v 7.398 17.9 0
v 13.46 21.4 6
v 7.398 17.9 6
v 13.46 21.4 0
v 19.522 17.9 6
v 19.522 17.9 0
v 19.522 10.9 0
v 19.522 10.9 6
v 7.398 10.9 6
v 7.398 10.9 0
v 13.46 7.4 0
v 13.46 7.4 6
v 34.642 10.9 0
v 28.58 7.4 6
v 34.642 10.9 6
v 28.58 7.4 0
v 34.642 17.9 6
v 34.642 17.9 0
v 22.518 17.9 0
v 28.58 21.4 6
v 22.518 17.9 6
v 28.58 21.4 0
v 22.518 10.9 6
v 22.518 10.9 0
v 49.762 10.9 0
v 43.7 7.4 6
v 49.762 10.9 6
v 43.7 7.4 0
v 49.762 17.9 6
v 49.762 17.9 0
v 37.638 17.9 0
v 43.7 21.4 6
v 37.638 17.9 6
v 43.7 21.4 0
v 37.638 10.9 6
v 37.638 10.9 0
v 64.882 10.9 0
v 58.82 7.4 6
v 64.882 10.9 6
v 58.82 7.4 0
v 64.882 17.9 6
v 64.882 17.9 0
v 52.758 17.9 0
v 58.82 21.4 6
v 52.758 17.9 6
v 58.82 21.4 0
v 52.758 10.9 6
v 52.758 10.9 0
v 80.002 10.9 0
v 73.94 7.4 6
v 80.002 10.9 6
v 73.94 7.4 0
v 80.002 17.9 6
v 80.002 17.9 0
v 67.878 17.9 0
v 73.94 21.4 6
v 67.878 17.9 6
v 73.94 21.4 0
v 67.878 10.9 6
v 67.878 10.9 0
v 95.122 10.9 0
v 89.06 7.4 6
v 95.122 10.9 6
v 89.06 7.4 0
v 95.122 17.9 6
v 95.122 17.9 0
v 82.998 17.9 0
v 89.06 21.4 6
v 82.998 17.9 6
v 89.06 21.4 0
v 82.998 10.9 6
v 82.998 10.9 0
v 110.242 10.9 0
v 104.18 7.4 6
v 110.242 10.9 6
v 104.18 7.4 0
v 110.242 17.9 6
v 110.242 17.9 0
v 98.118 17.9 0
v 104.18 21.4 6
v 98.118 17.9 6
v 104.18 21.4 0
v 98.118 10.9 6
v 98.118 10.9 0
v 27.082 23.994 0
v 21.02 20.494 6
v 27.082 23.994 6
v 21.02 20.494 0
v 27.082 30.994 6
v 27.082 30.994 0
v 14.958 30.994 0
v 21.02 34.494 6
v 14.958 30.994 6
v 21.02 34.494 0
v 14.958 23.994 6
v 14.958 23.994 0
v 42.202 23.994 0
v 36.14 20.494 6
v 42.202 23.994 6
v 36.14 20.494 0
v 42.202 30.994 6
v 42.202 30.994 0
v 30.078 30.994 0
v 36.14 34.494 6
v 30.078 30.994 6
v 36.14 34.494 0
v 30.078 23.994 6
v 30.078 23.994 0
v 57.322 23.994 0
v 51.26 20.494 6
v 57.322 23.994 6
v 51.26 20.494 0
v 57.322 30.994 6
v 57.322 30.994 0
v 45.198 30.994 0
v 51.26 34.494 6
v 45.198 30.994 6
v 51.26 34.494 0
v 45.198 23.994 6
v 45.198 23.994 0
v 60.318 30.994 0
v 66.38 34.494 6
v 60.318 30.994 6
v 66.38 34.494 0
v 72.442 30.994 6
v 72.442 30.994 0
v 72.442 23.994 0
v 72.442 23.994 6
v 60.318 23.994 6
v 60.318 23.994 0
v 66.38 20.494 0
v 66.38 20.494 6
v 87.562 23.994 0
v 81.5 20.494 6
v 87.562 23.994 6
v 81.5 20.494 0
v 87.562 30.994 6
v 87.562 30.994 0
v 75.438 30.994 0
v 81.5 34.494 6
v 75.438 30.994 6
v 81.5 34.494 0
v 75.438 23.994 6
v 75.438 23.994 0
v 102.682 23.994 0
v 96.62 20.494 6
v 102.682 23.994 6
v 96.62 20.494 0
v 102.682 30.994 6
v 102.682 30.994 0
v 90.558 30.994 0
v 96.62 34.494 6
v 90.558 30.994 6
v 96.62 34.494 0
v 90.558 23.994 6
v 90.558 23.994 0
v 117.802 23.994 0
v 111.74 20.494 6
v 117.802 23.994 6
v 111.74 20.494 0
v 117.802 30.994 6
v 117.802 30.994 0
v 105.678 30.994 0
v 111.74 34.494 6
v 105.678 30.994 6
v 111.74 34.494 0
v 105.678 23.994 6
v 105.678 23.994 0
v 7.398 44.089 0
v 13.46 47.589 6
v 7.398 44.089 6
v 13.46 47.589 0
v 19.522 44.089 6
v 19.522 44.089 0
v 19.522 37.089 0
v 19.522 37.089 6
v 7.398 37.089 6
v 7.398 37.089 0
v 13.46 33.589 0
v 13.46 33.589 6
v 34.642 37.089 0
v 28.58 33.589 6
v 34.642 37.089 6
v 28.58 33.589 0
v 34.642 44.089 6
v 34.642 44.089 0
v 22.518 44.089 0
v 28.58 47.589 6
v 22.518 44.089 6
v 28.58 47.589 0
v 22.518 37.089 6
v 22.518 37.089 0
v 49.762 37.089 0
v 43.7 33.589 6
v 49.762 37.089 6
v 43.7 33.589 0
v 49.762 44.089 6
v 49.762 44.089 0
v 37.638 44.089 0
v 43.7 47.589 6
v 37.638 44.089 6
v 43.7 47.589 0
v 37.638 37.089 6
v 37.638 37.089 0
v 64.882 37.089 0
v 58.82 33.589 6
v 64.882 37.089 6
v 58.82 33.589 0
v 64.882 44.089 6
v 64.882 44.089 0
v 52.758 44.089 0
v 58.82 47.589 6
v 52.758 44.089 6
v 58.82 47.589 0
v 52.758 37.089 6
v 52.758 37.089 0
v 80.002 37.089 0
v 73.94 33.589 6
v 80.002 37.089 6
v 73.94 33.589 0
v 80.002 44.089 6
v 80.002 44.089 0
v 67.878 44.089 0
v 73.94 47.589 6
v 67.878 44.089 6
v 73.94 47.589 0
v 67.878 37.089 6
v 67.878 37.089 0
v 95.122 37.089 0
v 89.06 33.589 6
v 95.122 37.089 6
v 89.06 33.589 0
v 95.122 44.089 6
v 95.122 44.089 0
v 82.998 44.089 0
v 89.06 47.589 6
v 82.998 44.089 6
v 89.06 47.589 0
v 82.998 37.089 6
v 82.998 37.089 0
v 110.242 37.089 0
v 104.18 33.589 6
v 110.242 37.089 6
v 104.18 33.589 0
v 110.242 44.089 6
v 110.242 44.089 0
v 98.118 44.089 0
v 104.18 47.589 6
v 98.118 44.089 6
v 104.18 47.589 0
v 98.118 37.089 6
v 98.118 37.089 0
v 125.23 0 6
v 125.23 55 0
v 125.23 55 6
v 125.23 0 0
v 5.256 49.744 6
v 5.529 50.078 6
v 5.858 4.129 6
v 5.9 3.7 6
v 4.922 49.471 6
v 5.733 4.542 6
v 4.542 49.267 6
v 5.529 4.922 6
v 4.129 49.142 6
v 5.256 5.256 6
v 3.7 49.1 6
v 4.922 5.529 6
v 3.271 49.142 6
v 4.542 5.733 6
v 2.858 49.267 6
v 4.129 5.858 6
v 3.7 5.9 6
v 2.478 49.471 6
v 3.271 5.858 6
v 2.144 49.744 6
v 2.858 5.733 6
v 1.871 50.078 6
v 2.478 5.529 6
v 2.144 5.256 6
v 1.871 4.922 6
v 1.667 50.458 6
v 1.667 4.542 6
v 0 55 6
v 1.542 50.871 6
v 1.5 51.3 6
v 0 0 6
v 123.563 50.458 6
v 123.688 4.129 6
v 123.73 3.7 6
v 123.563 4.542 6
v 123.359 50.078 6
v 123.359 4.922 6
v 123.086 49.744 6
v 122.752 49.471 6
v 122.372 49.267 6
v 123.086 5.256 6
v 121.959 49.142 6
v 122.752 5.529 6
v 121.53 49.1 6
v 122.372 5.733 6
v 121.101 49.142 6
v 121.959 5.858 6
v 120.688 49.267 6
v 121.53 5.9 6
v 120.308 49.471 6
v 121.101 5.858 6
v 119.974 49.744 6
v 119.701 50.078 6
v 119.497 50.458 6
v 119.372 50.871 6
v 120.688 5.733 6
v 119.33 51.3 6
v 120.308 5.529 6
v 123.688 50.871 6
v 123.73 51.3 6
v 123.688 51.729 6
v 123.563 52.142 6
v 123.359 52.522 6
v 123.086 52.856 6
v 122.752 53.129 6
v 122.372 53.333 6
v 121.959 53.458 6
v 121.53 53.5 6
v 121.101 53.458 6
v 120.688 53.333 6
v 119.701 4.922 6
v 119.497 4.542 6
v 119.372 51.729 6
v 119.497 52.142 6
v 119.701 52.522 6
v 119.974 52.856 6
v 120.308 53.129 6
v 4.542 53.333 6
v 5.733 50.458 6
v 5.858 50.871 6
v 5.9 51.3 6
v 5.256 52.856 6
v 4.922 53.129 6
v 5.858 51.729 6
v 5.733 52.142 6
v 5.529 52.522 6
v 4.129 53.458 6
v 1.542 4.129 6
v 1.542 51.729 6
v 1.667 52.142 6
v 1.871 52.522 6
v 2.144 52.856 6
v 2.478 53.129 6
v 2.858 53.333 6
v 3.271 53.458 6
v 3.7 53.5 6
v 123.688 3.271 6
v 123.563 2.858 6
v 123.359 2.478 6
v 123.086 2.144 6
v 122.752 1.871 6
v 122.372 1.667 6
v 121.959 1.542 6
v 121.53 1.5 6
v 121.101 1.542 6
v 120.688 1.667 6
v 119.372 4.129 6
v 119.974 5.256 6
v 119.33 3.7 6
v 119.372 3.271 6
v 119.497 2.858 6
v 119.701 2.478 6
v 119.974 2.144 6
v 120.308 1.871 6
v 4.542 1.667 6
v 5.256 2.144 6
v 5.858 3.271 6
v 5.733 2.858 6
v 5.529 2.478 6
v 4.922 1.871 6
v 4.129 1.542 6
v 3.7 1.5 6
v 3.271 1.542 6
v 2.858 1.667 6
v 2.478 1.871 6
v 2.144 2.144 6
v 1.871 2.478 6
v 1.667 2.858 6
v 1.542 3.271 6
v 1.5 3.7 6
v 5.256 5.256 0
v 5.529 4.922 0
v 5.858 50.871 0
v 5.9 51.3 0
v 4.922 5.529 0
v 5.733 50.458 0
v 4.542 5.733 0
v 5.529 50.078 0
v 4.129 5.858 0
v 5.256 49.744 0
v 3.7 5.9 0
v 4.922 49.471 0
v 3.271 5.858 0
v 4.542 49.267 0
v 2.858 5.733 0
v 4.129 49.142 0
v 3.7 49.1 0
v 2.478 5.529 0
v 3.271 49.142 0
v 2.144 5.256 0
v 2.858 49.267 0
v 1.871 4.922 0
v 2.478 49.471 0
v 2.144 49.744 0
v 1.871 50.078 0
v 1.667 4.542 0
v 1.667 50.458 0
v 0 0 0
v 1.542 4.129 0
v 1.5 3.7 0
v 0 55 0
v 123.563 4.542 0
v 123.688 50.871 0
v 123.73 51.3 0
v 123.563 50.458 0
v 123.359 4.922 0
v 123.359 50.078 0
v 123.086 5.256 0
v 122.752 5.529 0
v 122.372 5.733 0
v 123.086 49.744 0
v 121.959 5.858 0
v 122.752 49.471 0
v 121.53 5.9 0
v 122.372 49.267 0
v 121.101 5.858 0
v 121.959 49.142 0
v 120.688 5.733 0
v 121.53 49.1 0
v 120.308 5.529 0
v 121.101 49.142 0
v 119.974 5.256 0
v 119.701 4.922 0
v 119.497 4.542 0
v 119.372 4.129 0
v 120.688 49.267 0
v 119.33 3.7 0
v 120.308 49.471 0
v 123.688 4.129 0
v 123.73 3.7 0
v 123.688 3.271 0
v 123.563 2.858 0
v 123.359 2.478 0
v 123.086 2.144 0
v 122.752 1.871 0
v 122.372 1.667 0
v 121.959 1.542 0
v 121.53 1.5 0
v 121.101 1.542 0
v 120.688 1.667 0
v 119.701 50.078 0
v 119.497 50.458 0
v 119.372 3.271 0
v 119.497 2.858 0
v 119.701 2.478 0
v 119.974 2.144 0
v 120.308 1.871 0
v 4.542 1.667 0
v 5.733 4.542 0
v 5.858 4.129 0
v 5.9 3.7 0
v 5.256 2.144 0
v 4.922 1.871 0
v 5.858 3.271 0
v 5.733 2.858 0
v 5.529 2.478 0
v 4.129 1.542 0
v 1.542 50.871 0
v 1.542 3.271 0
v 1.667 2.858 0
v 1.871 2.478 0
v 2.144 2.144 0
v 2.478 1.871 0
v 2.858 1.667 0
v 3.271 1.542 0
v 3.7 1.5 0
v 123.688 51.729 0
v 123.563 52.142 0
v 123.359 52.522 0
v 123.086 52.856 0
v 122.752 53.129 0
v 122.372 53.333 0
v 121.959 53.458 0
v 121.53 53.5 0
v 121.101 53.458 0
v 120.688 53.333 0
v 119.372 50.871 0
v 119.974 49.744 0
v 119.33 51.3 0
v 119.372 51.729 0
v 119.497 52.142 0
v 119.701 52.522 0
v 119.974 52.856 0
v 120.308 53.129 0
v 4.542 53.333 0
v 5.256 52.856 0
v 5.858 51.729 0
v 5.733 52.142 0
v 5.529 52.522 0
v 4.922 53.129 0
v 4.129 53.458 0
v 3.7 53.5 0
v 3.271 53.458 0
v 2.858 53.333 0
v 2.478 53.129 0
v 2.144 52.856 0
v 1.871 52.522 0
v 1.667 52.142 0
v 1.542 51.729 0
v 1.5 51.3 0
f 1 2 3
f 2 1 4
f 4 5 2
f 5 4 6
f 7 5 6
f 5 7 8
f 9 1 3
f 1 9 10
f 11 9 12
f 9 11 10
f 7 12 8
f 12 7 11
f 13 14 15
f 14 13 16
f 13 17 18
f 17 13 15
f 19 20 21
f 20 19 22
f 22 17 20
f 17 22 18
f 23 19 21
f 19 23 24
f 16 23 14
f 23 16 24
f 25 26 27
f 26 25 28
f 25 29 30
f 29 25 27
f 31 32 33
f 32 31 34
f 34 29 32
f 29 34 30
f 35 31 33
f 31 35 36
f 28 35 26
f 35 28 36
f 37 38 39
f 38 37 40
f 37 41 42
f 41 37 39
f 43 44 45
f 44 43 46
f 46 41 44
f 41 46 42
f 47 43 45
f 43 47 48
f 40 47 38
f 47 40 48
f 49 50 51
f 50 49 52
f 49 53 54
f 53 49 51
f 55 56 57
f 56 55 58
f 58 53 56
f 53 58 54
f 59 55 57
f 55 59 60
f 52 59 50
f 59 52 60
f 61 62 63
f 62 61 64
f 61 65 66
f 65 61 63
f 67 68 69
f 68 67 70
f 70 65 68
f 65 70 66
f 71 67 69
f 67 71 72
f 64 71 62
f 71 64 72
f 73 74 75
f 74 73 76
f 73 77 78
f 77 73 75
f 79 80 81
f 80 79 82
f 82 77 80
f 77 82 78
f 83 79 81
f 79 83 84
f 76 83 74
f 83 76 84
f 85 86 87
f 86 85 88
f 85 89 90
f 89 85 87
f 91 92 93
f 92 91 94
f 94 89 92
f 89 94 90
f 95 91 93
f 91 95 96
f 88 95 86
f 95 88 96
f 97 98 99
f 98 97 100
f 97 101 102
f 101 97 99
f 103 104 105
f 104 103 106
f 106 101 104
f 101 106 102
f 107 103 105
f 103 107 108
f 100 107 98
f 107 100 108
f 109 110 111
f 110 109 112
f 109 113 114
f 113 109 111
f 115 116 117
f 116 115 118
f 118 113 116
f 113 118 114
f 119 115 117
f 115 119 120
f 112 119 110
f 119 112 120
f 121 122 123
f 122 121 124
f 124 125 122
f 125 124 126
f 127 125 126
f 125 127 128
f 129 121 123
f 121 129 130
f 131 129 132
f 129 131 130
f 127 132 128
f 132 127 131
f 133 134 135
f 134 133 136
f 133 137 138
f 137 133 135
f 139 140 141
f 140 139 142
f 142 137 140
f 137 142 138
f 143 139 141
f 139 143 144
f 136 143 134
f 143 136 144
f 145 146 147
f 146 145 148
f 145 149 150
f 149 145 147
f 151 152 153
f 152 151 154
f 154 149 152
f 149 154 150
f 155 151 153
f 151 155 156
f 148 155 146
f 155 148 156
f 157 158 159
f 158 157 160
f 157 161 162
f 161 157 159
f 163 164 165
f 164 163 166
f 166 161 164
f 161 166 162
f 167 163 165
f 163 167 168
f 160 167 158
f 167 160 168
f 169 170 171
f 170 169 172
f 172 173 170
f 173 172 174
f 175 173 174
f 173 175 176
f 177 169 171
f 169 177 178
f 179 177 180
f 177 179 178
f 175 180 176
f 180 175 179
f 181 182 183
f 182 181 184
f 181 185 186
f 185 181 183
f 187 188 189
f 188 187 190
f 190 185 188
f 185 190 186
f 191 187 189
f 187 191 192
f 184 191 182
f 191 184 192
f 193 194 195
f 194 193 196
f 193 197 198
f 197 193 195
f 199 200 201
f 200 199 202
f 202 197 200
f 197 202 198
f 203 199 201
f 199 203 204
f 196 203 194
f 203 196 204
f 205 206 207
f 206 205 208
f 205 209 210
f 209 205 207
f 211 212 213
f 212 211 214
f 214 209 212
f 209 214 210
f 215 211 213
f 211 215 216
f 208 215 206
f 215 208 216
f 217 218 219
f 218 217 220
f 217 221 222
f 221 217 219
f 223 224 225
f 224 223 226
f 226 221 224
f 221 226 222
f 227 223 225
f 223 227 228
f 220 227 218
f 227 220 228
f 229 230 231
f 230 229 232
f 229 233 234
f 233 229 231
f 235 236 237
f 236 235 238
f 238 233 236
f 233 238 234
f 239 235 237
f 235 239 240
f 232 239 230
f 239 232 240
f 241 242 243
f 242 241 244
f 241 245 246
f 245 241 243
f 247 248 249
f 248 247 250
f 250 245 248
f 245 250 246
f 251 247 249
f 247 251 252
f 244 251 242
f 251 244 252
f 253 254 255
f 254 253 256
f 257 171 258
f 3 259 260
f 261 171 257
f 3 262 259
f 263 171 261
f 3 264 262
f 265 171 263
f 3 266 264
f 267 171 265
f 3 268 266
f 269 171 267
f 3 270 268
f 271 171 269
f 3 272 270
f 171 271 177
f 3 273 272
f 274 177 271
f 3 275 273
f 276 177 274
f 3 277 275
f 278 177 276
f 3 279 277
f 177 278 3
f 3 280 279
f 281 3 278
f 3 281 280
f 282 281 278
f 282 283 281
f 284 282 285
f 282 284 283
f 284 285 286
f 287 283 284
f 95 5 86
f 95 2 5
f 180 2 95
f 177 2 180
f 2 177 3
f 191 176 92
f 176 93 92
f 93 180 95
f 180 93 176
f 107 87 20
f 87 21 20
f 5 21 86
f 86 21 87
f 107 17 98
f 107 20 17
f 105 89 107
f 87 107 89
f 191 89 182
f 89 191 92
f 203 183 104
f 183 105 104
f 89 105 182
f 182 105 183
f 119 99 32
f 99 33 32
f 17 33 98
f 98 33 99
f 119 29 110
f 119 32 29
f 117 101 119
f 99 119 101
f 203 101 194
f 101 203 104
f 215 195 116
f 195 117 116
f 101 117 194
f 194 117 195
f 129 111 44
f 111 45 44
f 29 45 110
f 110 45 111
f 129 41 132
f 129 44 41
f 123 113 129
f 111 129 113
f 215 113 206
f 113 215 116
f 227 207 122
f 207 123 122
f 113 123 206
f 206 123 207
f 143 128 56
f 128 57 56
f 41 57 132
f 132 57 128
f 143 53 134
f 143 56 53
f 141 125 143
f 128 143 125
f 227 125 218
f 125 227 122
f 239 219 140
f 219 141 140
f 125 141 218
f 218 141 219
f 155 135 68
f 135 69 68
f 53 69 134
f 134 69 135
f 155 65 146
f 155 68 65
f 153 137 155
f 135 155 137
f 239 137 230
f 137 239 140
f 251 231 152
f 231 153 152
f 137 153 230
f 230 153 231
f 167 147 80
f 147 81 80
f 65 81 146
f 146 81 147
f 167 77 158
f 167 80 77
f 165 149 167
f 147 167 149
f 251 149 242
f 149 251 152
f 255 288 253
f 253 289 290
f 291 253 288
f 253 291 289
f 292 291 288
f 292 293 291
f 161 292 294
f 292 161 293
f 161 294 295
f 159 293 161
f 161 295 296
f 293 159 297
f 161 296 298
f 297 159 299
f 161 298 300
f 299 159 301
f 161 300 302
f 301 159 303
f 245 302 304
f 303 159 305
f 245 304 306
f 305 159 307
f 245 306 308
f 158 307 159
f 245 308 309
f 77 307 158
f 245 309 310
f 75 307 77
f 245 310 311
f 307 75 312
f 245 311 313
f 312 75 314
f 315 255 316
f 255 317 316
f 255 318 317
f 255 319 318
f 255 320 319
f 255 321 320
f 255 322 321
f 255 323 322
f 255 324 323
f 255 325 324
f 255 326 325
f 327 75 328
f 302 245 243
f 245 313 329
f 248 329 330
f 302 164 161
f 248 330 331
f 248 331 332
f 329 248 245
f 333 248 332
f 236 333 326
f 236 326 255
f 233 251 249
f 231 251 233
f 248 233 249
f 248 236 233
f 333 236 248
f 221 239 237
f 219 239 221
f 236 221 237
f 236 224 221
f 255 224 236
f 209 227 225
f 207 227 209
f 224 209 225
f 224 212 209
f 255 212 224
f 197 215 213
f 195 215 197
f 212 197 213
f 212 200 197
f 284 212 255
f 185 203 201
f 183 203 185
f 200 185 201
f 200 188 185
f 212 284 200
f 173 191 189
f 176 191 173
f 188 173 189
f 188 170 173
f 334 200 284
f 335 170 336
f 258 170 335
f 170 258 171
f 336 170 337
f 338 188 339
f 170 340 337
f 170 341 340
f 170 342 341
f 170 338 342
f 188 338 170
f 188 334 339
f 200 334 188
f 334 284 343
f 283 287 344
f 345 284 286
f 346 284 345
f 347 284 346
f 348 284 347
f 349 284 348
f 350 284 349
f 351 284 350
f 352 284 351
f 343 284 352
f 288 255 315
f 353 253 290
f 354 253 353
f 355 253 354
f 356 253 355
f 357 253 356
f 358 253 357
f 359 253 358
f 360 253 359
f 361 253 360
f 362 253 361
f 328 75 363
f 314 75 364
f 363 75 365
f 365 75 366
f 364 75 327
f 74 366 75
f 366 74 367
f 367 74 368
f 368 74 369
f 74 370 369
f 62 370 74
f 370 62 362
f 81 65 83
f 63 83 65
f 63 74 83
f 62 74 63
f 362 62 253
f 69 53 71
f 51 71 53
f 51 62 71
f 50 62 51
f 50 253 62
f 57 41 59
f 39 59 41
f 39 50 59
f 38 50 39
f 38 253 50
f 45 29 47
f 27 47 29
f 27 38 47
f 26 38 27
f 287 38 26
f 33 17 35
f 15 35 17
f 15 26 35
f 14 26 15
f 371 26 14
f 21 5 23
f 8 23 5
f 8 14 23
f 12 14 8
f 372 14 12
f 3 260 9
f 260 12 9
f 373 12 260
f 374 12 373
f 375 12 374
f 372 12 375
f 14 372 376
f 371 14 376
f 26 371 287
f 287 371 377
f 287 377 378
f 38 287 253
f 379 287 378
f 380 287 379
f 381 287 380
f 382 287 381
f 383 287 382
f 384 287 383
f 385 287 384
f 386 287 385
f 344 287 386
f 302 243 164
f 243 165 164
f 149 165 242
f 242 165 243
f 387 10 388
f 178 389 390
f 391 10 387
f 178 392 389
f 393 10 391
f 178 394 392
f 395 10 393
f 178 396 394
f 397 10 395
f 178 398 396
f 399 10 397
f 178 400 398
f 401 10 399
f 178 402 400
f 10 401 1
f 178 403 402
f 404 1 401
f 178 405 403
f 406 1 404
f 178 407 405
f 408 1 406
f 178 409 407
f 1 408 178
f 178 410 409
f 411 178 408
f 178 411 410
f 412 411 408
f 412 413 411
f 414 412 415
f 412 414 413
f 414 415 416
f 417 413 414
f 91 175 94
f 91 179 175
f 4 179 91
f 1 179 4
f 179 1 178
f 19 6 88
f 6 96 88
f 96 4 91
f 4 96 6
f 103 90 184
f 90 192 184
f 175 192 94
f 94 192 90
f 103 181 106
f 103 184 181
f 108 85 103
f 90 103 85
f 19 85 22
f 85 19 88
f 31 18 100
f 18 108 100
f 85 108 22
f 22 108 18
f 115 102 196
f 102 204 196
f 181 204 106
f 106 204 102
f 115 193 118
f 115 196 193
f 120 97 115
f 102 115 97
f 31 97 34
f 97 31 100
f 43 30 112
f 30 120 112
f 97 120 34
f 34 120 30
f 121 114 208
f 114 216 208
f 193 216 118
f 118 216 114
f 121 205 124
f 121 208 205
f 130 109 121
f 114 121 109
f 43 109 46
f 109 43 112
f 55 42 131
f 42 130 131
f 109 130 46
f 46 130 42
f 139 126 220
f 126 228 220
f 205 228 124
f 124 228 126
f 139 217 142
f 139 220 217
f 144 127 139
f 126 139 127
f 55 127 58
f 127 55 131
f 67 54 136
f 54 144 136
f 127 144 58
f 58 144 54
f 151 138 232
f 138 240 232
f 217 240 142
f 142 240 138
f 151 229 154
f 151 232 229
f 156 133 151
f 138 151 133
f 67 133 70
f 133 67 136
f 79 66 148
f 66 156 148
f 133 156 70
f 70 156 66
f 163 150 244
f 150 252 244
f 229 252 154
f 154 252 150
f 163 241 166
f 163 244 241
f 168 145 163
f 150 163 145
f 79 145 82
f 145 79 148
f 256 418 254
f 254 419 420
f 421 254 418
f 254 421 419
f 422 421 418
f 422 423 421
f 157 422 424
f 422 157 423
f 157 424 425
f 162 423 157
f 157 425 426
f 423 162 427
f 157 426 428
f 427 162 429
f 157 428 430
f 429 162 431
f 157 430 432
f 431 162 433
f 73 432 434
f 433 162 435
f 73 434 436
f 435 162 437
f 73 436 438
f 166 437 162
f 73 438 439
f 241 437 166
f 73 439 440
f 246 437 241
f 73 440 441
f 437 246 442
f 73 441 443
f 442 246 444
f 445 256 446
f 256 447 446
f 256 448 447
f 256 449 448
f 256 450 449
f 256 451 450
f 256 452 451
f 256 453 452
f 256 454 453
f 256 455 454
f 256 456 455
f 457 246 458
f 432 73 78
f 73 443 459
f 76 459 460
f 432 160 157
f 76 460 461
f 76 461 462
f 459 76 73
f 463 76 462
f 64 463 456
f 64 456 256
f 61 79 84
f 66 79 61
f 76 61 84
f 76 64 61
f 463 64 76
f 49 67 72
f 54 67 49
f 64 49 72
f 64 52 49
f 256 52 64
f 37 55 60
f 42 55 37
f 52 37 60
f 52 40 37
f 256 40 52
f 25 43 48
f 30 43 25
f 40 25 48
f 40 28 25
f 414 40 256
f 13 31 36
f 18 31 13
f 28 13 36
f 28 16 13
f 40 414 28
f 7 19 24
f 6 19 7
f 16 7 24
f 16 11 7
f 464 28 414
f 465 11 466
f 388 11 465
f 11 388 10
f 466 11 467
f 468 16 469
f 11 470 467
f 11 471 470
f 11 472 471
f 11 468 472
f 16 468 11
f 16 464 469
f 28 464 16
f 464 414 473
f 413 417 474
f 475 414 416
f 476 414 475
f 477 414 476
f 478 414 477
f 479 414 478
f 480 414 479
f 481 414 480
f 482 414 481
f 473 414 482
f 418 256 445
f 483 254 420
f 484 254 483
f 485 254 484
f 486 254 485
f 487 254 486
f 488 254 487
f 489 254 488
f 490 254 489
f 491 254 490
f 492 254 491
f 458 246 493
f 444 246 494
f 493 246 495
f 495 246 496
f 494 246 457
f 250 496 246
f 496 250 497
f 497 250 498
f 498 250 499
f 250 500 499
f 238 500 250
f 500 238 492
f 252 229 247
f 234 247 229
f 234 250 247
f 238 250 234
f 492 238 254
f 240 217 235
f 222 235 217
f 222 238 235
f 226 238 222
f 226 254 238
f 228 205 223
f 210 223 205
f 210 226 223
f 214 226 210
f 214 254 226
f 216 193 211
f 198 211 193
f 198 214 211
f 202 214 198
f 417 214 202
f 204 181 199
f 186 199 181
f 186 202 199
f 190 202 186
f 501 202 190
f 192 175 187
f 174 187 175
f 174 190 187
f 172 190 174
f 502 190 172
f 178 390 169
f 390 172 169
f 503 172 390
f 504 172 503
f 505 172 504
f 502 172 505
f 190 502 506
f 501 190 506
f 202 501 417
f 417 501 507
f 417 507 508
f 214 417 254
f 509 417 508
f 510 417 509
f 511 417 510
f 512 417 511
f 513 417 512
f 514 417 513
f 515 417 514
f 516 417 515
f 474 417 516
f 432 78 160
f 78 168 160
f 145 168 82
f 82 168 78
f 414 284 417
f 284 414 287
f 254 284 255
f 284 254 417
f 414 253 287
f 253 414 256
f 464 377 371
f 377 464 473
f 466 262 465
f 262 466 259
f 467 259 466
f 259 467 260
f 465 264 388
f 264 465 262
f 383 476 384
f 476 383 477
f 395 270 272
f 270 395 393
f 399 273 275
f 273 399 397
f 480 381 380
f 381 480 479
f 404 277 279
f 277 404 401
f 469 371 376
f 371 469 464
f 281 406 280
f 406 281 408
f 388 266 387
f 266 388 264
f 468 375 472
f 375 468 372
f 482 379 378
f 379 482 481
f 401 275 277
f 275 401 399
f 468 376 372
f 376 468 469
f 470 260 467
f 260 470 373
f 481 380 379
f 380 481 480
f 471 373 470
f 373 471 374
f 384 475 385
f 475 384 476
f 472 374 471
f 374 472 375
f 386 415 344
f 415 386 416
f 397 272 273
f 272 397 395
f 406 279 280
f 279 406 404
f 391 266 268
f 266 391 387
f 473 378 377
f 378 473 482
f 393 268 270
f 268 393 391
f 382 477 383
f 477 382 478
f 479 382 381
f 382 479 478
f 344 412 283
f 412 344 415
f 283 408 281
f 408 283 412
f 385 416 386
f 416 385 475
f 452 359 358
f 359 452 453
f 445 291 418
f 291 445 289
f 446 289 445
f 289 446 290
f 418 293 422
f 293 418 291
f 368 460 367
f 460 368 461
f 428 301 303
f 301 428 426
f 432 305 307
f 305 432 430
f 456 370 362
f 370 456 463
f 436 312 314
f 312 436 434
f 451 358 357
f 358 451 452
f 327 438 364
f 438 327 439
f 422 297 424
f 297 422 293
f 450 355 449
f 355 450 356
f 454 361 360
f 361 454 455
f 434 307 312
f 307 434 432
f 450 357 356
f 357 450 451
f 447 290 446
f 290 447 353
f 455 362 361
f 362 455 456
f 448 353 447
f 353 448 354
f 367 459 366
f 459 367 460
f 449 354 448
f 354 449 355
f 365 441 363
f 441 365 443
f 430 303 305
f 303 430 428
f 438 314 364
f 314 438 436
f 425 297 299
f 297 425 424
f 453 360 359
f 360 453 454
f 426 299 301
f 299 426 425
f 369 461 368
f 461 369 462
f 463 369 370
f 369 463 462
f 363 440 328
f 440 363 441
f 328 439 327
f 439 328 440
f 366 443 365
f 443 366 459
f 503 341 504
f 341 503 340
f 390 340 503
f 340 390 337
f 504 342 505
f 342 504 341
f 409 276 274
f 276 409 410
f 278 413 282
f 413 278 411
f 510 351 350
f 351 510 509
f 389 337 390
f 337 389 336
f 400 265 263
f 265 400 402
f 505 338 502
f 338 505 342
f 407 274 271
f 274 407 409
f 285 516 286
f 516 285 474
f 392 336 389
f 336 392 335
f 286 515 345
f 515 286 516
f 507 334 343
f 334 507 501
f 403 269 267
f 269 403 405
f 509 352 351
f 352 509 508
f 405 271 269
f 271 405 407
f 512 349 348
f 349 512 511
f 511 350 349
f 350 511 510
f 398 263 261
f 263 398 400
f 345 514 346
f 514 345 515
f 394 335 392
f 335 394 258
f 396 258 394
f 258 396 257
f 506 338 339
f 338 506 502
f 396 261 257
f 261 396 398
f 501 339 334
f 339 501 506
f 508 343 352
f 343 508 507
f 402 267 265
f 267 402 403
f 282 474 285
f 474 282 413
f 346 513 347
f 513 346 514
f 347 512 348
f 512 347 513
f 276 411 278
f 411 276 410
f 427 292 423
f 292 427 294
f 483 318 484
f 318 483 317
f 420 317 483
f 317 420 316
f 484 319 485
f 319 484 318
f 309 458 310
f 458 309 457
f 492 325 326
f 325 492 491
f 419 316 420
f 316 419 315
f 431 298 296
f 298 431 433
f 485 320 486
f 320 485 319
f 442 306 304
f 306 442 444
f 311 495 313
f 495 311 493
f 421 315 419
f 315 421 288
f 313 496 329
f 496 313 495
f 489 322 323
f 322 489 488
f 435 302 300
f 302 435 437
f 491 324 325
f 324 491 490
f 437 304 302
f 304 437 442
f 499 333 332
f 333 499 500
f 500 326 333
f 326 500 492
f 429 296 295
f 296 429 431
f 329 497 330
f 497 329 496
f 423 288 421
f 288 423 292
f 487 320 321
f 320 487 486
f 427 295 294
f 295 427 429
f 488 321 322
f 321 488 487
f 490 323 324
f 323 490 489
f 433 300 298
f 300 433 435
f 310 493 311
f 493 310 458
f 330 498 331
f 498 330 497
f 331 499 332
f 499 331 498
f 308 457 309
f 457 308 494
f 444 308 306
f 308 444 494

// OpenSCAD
$fn = 32;

// ----------------------------------------------------------------------
// Honeycomb panel: 125.23 x 55 mm, 21 cells of 14 mm
// ----------------------------------------------------------------------

// --- parameters (mm) ---
panel_w = 125.23;         // panel width
panel_d = 55;             // panel depth
thick = 6;                // panel thickness
cell_r = 7;               // hex cell circumradius
pitch = 15.12;            // hex cell pitch (centre to centre)
web = 3;                  // web between the cells
columns = 7;              // columns of cells
rows = 3;                 // rows of cells
cell_count = 21;          // total cells
shift_x = 13.46;          // first cell offset in x
shift_y = 14.4;           // first cell offset in y
mount_d = 4.4;            // corner mounting holes
hole_off = 3.7;           // mounting hole offset from the corners

difference() {
  union() {
    cube([panel_w, panel_d, thick]);
  }
  /* hexagonal cells, point-up, cut right through the plate */
  for (row = [0 : rows - 1]) {
    for (col = [0 : columns - 1]) {
      translate([shift_x + col * pitch + (row % 2) * pitch / 2, shift_y + row * pitch * 0.866025, -2.5]) rotate([0, 0, 30]) cylinder(h = thick + 5, d = 2 * cell_r, $fn = 6);
    }
  }
  /* corner mounting holes, clear of the outer cell web */
  translate([3.7, 3.7, -2.5]) cylinder(h = thick + 5, d = mount_d);
  translate([121.53, 3.7, -2.5]) cylinder(h = thick + 5, d = mount_d);
  translate([3.7, 51.3, -2.5]) cylinder(h = thick + 5, d = mount_d);
  translate([121.53, 51.3, -2.5]) cylinder(h = thick + 5, d = mount_d);
}
